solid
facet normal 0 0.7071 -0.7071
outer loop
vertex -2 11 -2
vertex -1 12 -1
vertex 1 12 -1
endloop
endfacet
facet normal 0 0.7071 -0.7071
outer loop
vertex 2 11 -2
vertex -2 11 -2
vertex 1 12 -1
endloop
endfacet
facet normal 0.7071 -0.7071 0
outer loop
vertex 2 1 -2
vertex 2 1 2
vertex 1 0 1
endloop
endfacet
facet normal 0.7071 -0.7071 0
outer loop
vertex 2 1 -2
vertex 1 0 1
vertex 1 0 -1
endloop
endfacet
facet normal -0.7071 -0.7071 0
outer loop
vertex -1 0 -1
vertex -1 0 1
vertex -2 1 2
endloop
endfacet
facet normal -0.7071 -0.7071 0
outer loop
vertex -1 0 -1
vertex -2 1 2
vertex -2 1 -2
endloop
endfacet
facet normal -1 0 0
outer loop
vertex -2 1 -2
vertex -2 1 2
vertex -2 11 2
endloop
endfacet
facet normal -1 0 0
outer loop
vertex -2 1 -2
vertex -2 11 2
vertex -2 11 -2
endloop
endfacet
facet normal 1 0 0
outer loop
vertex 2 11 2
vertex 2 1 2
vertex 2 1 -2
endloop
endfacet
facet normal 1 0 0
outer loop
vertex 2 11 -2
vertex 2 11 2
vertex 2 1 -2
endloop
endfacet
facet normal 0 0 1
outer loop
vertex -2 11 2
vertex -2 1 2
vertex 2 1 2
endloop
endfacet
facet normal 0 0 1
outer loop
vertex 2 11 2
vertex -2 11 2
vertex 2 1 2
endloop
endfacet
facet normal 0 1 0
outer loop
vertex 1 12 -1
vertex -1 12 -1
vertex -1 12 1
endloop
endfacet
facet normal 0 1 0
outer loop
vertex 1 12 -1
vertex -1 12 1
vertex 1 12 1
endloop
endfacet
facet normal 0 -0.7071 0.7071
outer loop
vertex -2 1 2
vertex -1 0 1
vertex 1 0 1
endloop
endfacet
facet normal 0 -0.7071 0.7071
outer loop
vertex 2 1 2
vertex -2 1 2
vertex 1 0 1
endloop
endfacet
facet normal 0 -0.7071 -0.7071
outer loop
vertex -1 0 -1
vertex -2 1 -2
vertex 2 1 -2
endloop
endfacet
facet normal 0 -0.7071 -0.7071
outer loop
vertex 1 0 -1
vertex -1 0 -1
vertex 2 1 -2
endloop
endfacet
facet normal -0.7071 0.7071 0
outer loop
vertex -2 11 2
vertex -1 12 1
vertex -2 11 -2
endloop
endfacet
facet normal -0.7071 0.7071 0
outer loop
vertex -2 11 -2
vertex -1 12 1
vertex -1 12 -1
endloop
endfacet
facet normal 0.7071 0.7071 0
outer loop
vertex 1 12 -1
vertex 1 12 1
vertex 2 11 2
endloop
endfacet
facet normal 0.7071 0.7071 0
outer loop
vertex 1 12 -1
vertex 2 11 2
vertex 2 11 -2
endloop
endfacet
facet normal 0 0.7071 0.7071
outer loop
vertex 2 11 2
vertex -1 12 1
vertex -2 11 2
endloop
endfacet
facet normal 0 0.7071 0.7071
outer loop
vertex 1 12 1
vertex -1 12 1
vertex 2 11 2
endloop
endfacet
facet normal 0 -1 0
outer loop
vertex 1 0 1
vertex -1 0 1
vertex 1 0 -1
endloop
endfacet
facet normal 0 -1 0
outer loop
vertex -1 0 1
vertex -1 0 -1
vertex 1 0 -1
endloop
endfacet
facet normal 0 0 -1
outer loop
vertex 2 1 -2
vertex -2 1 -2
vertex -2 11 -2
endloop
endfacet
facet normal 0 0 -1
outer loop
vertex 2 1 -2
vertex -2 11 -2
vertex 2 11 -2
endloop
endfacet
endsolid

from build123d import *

# Parameters (mm, degrees)
SKETCH1_W           = 4
SKETCH1_H           = 4
BOSS_EXTRUDE1_DEPTH = 12
CHAMFER3_SIZE       = 1
CHAMFER4_SIZE       = 1


with BuildPart() as part:
    # Sketch1 → Boss-Extrude1 (new body)
    with BuildSketch(Plane(origin=(0, 0, 0), x_dir=(1, 0, 0), z_dir=(0, 1, 0))):
        Rectangle(SKETCH1_W, SKETCH1_H)
    extrude(amount=BOSS_EXTRUDE1_DEPTH)

    # Chamfer3
    chamfer3_edges = [part.edges().sort_by_distance(p)[0] for p in [
        (-2, 12, 0),
        (0, 12, 2),
        (2, 12, 0),
        (0, 12, -2),
    ]]
    chamfer(chamfer3_edges, length=CHAMFER3_SIZE)

    # Chamfer4
    chamfer4_edges = [part.edges().sort_by_distance(p)[0] for p in [
        (0, 0, 2),
        (-2, 0, 0),
        (0, 0, -2),
        (2, 0, 0),
    ]]
    chamfer(chamfer4_edges, length=CHAMFER4_SIZE)


solid = part.part
